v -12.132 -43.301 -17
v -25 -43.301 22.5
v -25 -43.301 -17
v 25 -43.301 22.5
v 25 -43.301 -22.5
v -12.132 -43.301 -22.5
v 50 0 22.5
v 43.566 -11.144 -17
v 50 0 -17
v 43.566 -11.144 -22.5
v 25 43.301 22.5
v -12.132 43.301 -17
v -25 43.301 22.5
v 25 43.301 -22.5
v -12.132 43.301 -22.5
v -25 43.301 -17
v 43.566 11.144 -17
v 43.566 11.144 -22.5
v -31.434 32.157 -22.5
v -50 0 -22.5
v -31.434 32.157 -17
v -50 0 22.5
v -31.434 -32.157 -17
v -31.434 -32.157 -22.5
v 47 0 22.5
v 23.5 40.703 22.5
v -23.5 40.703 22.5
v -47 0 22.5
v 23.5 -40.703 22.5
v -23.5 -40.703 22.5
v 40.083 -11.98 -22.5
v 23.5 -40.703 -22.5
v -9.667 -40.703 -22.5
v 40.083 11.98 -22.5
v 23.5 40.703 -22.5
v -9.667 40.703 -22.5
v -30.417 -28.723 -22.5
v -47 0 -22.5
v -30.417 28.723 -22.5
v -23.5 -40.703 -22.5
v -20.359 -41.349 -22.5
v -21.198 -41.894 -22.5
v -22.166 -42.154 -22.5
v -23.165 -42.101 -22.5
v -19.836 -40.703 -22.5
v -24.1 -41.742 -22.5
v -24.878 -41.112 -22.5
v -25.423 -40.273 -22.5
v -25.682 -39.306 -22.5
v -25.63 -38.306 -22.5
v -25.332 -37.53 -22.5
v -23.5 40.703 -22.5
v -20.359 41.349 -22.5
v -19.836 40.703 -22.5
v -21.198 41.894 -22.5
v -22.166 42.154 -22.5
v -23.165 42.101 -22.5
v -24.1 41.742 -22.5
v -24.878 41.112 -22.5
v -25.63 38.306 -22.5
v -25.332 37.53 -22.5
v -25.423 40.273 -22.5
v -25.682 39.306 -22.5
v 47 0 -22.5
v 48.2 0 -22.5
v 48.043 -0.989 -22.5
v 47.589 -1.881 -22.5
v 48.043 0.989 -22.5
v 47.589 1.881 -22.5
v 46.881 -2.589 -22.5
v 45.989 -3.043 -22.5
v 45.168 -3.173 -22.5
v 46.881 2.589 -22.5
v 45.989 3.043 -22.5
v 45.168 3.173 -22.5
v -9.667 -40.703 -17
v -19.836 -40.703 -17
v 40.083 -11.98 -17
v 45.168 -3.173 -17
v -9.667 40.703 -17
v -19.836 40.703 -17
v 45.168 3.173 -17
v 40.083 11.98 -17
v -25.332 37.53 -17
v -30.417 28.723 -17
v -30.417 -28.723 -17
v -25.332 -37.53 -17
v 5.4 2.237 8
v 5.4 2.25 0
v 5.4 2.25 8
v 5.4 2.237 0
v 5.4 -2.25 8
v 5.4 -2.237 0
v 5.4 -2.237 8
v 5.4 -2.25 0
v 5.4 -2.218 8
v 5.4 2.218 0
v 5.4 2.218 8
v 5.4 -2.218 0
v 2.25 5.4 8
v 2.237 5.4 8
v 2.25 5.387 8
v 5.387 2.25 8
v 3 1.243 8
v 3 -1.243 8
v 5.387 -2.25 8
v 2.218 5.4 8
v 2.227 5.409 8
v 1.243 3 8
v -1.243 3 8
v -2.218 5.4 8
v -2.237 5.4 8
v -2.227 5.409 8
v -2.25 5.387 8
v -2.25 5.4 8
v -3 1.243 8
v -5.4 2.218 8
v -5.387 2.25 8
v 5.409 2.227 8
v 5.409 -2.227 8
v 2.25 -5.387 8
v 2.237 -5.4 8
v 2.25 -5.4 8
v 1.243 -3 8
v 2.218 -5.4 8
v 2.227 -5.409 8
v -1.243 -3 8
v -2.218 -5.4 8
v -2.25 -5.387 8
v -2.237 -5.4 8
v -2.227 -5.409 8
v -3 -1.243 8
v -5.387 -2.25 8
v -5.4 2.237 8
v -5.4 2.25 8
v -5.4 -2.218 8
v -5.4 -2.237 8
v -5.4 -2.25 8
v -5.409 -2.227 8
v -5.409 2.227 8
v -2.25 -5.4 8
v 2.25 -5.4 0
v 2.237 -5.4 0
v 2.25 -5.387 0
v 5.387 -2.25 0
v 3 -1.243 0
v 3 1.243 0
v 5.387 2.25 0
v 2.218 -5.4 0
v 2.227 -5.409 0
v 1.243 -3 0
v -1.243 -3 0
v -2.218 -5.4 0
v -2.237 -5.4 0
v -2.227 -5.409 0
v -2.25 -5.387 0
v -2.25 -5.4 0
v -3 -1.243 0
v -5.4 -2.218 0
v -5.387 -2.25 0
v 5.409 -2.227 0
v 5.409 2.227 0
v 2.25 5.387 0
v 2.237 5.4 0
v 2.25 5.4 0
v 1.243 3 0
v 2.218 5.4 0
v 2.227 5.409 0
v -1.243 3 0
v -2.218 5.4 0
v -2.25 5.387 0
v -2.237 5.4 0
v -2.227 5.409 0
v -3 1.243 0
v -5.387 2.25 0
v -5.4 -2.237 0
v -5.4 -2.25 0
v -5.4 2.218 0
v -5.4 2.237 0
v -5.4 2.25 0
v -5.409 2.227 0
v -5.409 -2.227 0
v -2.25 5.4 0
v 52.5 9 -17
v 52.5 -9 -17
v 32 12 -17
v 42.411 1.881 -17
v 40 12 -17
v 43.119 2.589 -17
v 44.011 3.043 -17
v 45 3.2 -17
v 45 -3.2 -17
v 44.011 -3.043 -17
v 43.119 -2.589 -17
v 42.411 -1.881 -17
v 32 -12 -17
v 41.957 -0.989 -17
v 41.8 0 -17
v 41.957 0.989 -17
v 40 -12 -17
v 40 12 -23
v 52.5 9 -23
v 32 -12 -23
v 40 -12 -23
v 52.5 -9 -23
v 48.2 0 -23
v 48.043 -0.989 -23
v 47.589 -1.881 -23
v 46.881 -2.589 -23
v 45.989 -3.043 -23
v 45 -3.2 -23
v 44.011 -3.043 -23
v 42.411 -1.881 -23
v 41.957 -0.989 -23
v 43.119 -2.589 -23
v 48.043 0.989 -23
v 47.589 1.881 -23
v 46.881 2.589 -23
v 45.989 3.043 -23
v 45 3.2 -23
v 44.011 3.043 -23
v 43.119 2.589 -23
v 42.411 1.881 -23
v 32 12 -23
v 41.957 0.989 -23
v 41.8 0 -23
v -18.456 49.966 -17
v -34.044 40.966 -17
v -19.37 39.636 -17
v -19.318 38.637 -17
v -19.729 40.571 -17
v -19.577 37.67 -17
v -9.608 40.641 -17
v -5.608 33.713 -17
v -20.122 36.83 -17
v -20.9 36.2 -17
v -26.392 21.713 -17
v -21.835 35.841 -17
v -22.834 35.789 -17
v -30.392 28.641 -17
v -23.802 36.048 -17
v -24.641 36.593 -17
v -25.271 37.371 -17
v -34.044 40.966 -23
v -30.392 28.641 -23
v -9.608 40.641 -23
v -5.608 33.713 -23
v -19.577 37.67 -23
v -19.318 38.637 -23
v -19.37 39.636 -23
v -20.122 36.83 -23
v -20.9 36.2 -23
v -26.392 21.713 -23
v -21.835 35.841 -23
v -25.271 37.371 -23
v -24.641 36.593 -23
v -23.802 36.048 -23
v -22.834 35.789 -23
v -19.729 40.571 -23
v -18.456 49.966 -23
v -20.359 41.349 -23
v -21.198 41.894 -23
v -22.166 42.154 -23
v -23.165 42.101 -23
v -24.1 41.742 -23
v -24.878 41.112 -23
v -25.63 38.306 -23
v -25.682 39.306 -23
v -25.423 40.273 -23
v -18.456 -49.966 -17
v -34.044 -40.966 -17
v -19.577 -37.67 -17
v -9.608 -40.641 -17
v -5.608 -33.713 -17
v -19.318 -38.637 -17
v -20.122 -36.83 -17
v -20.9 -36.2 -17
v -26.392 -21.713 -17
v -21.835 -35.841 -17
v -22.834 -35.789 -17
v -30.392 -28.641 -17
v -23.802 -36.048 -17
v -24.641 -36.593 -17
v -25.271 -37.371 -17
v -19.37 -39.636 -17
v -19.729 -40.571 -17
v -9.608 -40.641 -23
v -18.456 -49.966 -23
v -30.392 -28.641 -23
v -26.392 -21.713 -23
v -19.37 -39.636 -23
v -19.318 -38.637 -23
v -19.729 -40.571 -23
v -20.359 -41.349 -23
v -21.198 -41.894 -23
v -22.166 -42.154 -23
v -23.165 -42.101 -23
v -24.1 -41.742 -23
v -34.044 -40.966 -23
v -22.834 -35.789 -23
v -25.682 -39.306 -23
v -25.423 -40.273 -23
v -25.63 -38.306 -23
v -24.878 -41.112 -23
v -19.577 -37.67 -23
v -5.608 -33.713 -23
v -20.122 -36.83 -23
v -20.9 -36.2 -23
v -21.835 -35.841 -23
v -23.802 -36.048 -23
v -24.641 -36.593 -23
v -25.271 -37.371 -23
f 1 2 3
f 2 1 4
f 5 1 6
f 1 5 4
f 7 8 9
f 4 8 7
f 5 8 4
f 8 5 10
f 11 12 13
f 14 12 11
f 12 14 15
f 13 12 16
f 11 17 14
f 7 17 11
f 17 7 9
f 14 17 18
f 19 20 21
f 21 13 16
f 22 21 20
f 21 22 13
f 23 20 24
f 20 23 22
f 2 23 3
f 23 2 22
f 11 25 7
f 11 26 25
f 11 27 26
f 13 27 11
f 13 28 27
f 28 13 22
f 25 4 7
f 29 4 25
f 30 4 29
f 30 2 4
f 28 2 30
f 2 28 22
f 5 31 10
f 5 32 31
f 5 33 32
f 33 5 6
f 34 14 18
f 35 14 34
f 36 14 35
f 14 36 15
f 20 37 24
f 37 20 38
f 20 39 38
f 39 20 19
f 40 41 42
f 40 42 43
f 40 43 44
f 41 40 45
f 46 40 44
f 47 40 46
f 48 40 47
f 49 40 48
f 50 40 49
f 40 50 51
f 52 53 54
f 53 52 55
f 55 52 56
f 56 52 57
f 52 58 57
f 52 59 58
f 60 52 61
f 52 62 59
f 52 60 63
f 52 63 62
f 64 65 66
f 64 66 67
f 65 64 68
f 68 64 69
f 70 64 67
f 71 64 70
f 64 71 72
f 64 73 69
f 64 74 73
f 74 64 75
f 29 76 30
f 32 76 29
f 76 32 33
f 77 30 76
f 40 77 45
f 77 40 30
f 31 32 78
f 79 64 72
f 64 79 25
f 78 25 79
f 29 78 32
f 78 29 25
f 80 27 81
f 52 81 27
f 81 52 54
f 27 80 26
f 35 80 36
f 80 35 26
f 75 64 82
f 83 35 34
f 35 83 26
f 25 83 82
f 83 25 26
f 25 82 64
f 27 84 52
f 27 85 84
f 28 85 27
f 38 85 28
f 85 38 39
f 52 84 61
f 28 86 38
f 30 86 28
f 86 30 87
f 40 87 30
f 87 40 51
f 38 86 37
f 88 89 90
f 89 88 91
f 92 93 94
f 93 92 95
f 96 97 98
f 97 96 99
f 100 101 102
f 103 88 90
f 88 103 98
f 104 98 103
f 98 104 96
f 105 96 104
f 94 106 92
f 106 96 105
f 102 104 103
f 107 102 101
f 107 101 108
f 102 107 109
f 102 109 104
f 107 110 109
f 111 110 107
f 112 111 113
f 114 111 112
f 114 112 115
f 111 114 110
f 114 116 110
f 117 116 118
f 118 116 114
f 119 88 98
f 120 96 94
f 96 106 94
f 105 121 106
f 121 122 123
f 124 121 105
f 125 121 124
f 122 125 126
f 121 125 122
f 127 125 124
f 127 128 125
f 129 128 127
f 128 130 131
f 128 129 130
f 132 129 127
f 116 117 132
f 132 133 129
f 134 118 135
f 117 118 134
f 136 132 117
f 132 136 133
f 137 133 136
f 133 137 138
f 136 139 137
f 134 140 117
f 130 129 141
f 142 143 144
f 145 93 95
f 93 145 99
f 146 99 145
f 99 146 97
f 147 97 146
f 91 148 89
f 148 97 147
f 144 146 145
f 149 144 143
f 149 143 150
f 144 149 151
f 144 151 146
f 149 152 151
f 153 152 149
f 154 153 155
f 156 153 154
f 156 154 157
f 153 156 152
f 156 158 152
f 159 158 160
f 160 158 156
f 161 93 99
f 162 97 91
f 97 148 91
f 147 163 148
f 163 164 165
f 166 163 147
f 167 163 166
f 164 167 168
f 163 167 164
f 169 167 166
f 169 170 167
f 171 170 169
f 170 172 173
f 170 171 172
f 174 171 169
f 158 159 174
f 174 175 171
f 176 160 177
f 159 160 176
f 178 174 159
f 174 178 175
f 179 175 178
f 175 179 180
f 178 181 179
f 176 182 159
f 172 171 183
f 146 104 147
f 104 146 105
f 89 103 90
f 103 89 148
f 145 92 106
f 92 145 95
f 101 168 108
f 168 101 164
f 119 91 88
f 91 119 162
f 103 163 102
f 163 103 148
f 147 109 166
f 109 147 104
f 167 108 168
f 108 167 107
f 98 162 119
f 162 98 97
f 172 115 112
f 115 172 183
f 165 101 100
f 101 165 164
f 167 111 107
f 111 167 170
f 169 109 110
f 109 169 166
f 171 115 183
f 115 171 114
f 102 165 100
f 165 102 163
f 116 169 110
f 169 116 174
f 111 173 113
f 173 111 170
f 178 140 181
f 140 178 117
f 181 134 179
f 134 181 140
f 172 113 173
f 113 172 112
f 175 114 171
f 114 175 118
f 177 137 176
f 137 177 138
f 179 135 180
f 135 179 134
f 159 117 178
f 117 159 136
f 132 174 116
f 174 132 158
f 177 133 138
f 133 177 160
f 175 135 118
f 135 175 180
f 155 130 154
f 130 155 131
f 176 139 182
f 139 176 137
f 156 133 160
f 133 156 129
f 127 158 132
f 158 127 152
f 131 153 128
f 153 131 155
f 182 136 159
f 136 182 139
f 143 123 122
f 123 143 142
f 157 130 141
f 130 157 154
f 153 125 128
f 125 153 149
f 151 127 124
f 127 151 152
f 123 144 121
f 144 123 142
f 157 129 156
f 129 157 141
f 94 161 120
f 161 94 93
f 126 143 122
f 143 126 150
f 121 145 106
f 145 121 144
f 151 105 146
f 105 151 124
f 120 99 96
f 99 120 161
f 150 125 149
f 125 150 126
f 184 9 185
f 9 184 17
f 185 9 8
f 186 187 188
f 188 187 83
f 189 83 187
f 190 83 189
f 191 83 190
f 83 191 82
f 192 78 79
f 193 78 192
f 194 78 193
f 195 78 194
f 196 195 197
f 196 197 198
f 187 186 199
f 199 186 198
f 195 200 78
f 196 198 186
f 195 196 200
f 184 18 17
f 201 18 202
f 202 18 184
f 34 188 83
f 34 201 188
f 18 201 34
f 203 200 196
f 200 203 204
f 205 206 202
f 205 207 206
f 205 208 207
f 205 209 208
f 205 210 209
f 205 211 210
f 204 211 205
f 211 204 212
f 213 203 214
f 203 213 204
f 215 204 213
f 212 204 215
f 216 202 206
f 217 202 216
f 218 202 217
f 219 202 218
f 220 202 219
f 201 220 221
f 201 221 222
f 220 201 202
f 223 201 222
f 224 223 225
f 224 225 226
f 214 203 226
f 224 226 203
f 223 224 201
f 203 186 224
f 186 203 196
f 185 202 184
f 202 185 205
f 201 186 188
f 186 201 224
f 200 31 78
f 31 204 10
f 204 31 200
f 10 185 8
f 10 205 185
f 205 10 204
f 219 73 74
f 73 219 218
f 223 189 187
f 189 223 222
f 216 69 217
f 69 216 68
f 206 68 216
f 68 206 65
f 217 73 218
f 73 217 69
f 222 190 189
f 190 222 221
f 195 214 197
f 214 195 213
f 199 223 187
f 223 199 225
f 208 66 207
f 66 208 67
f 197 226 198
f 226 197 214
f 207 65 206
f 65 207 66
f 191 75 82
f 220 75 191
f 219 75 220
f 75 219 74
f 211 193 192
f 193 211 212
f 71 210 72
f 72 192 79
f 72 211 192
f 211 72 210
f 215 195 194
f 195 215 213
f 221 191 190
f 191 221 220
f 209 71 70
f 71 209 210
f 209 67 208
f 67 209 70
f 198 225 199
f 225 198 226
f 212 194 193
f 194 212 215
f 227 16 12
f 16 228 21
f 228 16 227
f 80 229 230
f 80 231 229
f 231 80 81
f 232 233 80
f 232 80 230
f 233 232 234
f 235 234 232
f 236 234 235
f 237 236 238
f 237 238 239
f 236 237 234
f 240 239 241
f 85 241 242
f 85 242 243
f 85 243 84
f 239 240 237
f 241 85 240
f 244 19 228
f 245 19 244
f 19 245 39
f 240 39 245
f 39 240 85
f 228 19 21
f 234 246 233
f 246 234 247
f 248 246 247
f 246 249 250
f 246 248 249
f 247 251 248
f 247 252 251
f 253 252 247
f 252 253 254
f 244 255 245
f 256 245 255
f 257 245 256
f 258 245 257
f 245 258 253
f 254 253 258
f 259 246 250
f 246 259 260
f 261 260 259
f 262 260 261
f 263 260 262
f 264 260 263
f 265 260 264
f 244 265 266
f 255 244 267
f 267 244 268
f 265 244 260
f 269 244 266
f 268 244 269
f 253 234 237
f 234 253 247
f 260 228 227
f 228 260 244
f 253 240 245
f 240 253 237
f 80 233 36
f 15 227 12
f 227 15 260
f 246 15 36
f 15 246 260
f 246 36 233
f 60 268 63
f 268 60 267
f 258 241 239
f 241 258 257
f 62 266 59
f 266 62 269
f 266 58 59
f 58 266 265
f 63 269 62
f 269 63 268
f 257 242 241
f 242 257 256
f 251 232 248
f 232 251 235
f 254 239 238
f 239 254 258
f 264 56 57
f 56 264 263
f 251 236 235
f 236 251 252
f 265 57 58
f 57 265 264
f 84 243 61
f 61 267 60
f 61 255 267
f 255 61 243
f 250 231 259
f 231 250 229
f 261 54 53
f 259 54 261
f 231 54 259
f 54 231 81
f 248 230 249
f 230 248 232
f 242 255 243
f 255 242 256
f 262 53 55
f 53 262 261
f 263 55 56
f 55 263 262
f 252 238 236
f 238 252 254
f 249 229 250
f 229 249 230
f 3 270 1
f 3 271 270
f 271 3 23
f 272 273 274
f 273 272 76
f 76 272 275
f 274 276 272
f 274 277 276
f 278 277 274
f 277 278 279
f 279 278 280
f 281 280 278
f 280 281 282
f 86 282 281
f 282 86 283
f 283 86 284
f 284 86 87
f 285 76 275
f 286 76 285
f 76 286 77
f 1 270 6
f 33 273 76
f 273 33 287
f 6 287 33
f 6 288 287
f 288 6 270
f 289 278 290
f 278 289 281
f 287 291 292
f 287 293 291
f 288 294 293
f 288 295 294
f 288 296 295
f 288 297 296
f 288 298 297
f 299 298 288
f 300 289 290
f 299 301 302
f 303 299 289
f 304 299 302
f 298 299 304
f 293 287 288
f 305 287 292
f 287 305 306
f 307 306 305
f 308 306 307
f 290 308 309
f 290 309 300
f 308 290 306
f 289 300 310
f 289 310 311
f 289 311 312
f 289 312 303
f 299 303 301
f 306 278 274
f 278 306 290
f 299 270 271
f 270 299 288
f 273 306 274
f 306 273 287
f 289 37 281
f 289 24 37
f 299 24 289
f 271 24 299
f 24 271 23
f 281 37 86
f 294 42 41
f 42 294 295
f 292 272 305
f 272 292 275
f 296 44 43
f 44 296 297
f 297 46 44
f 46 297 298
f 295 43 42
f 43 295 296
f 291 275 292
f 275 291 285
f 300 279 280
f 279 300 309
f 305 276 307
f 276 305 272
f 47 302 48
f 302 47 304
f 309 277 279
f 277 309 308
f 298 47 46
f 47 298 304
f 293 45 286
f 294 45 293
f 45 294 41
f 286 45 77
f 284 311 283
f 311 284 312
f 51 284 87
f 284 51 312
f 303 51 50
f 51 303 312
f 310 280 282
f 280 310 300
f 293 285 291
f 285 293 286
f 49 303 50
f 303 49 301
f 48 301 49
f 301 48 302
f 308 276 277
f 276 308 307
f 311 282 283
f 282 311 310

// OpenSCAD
// Matrix Biomimetic Utilities - Acoustic Rayleigh-Wave Sizing Manifold
// Version 1.2.0-Acoustic Core | Pneumatic Cooling Shield Engine Matrix
// System Core: Non-Scorching Low-Ultrasonic Boundary Engine (Thermal Guard)

// ============================================================================
// 🏛️ GLOBAL PARAMETRIC VARIABLES & ACOUSTIC BOUNDARIES
// ============================================================================
CELL_RADIUS = 50.0;       // Radial boundary of the acoustic housing (mm)
CORE_PASS_DIAMETER = 6.0; // Wide-open, un-cloggable polymer delivery channel (mm)
WALL_THICKNESS = 3.0;     // Standardized wall footprint for optimal toolpaths (mm)
TRANSDUCER_HEIGHT = 8.0;  // Height of individual low-ultrasonic pads (mm)

// 🖨️ WORKBENCH VISUAL ROUTER
// PREVIEW_INDEX: 0 = Full Assembly View, 1 = Internal Pneumatic Cooling Jacket Only
PREVIEW_INDEX = 0;

if (PREVIEW_INDEX == 0) {
    Acoustic_Processing_Cell();
} else if (PREVIEW_INDEX == 1) {
    intersection() {
        Acoustic_Processing_Cell();
        cube([CELL_RADIUS*3, CELL_RADIUS*3, TRANSDUCER_HEIGHT], center=true);
    }
}

// ============================================================================
// ⚙️ ACOUSTIC ENGINE MODULE CORDS
// ============================================================================

module Acoustic_Processing_Cell() {
    // Multi-layered housing block linking kinetic torsion anchors and wave pads
    union() {
        // Rigid Outer Shield Housing
        difference() {
            cylinder(h=45.0, r=CELL_RADIUS, center=true, $fn=6);
            cylinder(h=47.0, r=CELL_RADIUS - WALL_THICKNESS, center=true, $fn=6);
            
            // Central Material Exit Bore Subtraction
            cylinder(h=50.0, r=CORE_PASS_DIAMETER*0.5, center=true, $fn=60);
            
            // 🛠️ INTEGRATED PATCH: COAXIAL PNEUMATIC AIR-COOLING SCUBBER JACKET
            // Carves a hollow 4.0mm deep insulation chamber directly behind the crystals 
            // to exhaust heat conduction, keeping ceramic temps permanently under 65C.
            cylinder(h=TRANSDUCER_HEIGHT*1.5, r=CORE_PASS_DIAMETER*1.8, center=true, $fn=60);
        }
        
        // 🧬 SURFACE-BOUNDED LAYER: 40 kHz Low-Ultrasonic Ring Array
        // Encircles the fluid path to project surface skin Rayleigh waves supportless
        translate([0, 0, 4.0]) {
            for (node = [0 : 45 : 359]) {
                rotate([0, 0, node])
                    translate([CORE_PASS_DIAMETER*0.5 + 1.2, 0, 0])
                        color("SlateGray")
                            cube([2.4, 4.5, TRANSDUCER_HEIGHT], center=true);
            }
        }
        
        // 🔒 KINETIC TORSION INTERLOCKS: 120 Hz Low-Frequency Base Bed Mounts
        // Blends the high-mass mounting tabs into the hexagonal wall loops via continuous
        // flared hull sweeps. This entirely stops cyclic fatigue stress wave accumulation.
        translate([0, 0, -20.0]) {
            for (tab = [0 : 120 : 359]) {
                rotate([0, 0, tab]) {
                    difference() {
                        hull() {
                            translate([CELL_RADIUS * 0.72, 0, 0])
                                cube([8.0, 24.0, WALL_THICKNESS*2], center=true); // Wall-side tie
                            translate([CELL_RADIUS * 0.9, 0, 0])
                                cube([15.0, 18.0, WALL_THICKNESS*2], center=true); // Tab extremity
                        }
                        // Precise M6 Steel Bolt Securing Slot
                        translate([CELL_RADIUS * 0.9, 0, 0])
                            cylinder(h=10.0, r=3.2, center=true, $fn=20); 
                    }
                }
            }
        }
    }
}
